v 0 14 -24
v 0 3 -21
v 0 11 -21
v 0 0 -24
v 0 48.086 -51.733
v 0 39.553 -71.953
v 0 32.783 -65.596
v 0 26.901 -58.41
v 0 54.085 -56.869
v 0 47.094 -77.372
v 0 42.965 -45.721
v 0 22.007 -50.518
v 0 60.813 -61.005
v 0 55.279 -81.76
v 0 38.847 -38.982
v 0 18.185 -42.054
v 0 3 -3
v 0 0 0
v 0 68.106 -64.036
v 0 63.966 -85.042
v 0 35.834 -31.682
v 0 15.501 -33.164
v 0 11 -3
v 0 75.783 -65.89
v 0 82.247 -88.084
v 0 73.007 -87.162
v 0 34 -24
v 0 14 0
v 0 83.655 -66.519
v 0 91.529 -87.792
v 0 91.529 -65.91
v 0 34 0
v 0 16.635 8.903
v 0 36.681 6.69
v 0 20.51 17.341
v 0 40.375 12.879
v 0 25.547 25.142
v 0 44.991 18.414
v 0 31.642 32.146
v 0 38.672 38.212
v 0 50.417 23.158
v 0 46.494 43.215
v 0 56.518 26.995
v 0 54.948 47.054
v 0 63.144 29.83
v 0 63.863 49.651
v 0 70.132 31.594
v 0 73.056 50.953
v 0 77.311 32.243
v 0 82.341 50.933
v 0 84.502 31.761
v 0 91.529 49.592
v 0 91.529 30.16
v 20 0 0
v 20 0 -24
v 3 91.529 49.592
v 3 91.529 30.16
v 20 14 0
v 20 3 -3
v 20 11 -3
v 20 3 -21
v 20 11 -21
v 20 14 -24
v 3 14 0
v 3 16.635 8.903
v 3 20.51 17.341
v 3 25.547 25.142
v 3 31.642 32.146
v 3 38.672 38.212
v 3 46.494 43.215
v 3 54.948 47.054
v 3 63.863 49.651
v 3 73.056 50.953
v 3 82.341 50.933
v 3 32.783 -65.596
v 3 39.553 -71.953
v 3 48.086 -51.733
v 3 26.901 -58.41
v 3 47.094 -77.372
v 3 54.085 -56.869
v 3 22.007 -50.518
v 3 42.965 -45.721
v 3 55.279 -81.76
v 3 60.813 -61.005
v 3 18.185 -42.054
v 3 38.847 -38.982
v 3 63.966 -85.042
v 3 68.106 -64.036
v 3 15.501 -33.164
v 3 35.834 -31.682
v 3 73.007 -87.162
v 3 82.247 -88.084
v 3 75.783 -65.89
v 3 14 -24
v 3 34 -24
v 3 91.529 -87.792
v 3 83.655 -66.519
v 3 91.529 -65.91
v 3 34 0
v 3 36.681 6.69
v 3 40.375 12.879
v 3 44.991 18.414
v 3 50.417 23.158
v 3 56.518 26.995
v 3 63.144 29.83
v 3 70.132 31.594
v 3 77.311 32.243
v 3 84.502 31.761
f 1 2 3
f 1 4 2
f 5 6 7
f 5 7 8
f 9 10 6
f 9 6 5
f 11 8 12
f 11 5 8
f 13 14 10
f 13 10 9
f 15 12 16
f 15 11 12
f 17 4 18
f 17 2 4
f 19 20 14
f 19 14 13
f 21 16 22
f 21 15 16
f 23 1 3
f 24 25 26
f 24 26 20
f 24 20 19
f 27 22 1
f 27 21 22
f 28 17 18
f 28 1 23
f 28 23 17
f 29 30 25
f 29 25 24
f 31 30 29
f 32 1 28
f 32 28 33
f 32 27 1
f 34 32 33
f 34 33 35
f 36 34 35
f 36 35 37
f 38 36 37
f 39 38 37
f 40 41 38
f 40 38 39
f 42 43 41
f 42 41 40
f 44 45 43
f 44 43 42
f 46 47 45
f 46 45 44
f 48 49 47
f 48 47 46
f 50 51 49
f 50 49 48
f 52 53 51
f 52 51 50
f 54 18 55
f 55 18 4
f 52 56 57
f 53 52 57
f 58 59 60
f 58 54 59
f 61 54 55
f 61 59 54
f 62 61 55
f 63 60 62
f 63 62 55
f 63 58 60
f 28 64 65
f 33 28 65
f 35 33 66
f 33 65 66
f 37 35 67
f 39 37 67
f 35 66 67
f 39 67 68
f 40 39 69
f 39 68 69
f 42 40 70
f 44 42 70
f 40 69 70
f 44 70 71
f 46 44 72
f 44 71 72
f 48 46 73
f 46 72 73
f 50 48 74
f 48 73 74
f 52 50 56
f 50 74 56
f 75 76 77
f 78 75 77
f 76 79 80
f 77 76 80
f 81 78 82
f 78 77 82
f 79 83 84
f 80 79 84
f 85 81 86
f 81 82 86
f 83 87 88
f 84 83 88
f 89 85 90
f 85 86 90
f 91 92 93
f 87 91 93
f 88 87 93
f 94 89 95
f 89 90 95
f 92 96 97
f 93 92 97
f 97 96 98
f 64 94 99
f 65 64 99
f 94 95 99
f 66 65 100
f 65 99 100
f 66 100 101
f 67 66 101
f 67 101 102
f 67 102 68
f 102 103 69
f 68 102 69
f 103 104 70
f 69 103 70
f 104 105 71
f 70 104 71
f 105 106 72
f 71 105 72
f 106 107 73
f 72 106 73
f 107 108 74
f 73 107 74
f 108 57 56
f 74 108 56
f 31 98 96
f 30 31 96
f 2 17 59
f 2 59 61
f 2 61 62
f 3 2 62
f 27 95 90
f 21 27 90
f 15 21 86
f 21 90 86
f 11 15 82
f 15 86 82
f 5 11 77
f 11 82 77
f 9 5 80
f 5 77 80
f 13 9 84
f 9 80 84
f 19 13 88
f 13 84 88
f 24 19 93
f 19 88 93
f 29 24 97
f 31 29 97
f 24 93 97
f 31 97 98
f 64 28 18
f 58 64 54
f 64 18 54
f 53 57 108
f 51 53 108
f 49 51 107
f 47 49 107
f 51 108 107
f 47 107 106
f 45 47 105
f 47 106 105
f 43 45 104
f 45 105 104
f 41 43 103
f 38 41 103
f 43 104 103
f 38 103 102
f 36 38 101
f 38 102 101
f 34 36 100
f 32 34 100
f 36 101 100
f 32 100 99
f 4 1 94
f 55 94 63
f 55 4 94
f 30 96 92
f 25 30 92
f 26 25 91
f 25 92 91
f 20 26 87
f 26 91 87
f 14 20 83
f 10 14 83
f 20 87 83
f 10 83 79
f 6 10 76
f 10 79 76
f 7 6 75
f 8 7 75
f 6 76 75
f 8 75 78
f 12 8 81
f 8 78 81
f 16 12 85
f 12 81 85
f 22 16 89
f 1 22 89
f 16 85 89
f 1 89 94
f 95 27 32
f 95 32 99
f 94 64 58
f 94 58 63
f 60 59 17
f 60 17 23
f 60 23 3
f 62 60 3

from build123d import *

# Parameters (mm, degrees)
SKETCH1_W           = 24
SKETCH1_H           = 14
SKETCH1_W_2         = 18
SKETCH1_H_2         = 8
BOSS_EXTRUDE1_DEPTH = 20
SKETCH3_W           = 3
SKETCH3_H           = 24
BOSS_EXTRUDE2_DEPTH = 20
BOSS_EXTRUDE4_DEPTH = 3


with BuildPart() as part:
    # Sketch1 → Boss-Extrude1 (new body)
    with BuildSketch(Plane(origin=(0, 0, 0), x_dir=(0, 0, -1), z_dir=(1, 0, 0))):
        with Locations((12, 7)):
            Rectangle(SKETCH1_W, SKETCH1_H)
        with Locations((12, 7)):
            Rectangle(SKETCH1_W_2, SKETCH1_H_2, mode=Mode.SUBTRACT)
    extrude(amount=BOSS_EXTRUDE1_DEPTH)

    # Sketch3 → Boss-Extrude2 (add)
    with BuildSketch(Plane(origin=(0, 14, 0), x_dir=(1, 0, 0), z_dir=(0, 1, 0))):
        with Locations((1.5, 12)):
            Rectangle(SKETCH3_W, SKETCH3_H)
    extrude(amount=BOSS_EXTRUDE2_DEPTH)

    # Sketch5 → Boss-Extrude4 (add)
    with BuildSketch(Plane(origin=(3, 0, 0), x_dir=(0, 0, -1), z_dir=(1, 0, 0))):
        with BuildLine():
            Line((-49.592274582, 91.528999548), (-30.16014503, 91.528999548))
            ThreePointArc((-30.16014503, 91.528999548), (-26.994718436, 56.518129217), (0, 34))
            Line((0, 34), (0, 14))
            ThreePointArc((0, 14), (-40.852918836, 42.493603413), (-49.592274582, 91.528999548))
        make_face()
        with BuildLine():
            Line((65.909693645, 91.528999548), (87.792134304, 91.528999548))
            ThreePointArc((87.792134304, 91.528999548), (71.952848697, 39.552716173), (24, 14))
            Line((24, 14), (24, 34))
            ThreePointArc((24, 34), (56.869492744, 54.084718023), (65.909693645, 91.528999548))
        make_face()
    extrude(amount=-BOSS_EXTRUDE4_DEPTH)


solid = part.part
